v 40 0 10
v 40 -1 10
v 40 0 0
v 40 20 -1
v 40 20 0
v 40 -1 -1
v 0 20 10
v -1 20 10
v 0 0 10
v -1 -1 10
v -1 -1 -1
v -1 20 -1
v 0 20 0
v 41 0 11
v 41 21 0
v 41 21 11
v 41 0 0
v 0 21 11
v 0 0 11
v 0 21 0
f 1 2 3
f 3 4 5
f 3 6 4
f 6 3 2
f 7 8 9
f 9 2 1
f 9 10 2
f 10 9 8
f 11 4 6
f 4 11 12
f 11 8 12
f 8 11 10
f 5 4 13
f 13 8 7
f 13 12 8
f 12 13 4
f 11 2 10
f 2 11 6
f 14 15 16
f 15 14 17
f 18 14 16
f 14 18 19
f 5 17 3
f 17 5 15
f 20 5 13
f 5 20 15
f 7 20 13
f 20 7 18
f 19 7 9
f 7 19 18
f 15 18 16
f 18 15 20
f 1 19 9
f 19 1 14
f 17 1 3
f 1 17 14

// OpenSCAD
// Unit of length: Unit.MM
union()
{
   color(c = [1.0, 0.0, 0.0, 1.0])
   {
      translate(v = [-1.0, -1.0, -1.0])
      {
         cube(size = [41.0, 21.0, 11.0], center = false);
      }
   }
   cube(size = [41.0, 21.0, 11.0], center = false);
}
